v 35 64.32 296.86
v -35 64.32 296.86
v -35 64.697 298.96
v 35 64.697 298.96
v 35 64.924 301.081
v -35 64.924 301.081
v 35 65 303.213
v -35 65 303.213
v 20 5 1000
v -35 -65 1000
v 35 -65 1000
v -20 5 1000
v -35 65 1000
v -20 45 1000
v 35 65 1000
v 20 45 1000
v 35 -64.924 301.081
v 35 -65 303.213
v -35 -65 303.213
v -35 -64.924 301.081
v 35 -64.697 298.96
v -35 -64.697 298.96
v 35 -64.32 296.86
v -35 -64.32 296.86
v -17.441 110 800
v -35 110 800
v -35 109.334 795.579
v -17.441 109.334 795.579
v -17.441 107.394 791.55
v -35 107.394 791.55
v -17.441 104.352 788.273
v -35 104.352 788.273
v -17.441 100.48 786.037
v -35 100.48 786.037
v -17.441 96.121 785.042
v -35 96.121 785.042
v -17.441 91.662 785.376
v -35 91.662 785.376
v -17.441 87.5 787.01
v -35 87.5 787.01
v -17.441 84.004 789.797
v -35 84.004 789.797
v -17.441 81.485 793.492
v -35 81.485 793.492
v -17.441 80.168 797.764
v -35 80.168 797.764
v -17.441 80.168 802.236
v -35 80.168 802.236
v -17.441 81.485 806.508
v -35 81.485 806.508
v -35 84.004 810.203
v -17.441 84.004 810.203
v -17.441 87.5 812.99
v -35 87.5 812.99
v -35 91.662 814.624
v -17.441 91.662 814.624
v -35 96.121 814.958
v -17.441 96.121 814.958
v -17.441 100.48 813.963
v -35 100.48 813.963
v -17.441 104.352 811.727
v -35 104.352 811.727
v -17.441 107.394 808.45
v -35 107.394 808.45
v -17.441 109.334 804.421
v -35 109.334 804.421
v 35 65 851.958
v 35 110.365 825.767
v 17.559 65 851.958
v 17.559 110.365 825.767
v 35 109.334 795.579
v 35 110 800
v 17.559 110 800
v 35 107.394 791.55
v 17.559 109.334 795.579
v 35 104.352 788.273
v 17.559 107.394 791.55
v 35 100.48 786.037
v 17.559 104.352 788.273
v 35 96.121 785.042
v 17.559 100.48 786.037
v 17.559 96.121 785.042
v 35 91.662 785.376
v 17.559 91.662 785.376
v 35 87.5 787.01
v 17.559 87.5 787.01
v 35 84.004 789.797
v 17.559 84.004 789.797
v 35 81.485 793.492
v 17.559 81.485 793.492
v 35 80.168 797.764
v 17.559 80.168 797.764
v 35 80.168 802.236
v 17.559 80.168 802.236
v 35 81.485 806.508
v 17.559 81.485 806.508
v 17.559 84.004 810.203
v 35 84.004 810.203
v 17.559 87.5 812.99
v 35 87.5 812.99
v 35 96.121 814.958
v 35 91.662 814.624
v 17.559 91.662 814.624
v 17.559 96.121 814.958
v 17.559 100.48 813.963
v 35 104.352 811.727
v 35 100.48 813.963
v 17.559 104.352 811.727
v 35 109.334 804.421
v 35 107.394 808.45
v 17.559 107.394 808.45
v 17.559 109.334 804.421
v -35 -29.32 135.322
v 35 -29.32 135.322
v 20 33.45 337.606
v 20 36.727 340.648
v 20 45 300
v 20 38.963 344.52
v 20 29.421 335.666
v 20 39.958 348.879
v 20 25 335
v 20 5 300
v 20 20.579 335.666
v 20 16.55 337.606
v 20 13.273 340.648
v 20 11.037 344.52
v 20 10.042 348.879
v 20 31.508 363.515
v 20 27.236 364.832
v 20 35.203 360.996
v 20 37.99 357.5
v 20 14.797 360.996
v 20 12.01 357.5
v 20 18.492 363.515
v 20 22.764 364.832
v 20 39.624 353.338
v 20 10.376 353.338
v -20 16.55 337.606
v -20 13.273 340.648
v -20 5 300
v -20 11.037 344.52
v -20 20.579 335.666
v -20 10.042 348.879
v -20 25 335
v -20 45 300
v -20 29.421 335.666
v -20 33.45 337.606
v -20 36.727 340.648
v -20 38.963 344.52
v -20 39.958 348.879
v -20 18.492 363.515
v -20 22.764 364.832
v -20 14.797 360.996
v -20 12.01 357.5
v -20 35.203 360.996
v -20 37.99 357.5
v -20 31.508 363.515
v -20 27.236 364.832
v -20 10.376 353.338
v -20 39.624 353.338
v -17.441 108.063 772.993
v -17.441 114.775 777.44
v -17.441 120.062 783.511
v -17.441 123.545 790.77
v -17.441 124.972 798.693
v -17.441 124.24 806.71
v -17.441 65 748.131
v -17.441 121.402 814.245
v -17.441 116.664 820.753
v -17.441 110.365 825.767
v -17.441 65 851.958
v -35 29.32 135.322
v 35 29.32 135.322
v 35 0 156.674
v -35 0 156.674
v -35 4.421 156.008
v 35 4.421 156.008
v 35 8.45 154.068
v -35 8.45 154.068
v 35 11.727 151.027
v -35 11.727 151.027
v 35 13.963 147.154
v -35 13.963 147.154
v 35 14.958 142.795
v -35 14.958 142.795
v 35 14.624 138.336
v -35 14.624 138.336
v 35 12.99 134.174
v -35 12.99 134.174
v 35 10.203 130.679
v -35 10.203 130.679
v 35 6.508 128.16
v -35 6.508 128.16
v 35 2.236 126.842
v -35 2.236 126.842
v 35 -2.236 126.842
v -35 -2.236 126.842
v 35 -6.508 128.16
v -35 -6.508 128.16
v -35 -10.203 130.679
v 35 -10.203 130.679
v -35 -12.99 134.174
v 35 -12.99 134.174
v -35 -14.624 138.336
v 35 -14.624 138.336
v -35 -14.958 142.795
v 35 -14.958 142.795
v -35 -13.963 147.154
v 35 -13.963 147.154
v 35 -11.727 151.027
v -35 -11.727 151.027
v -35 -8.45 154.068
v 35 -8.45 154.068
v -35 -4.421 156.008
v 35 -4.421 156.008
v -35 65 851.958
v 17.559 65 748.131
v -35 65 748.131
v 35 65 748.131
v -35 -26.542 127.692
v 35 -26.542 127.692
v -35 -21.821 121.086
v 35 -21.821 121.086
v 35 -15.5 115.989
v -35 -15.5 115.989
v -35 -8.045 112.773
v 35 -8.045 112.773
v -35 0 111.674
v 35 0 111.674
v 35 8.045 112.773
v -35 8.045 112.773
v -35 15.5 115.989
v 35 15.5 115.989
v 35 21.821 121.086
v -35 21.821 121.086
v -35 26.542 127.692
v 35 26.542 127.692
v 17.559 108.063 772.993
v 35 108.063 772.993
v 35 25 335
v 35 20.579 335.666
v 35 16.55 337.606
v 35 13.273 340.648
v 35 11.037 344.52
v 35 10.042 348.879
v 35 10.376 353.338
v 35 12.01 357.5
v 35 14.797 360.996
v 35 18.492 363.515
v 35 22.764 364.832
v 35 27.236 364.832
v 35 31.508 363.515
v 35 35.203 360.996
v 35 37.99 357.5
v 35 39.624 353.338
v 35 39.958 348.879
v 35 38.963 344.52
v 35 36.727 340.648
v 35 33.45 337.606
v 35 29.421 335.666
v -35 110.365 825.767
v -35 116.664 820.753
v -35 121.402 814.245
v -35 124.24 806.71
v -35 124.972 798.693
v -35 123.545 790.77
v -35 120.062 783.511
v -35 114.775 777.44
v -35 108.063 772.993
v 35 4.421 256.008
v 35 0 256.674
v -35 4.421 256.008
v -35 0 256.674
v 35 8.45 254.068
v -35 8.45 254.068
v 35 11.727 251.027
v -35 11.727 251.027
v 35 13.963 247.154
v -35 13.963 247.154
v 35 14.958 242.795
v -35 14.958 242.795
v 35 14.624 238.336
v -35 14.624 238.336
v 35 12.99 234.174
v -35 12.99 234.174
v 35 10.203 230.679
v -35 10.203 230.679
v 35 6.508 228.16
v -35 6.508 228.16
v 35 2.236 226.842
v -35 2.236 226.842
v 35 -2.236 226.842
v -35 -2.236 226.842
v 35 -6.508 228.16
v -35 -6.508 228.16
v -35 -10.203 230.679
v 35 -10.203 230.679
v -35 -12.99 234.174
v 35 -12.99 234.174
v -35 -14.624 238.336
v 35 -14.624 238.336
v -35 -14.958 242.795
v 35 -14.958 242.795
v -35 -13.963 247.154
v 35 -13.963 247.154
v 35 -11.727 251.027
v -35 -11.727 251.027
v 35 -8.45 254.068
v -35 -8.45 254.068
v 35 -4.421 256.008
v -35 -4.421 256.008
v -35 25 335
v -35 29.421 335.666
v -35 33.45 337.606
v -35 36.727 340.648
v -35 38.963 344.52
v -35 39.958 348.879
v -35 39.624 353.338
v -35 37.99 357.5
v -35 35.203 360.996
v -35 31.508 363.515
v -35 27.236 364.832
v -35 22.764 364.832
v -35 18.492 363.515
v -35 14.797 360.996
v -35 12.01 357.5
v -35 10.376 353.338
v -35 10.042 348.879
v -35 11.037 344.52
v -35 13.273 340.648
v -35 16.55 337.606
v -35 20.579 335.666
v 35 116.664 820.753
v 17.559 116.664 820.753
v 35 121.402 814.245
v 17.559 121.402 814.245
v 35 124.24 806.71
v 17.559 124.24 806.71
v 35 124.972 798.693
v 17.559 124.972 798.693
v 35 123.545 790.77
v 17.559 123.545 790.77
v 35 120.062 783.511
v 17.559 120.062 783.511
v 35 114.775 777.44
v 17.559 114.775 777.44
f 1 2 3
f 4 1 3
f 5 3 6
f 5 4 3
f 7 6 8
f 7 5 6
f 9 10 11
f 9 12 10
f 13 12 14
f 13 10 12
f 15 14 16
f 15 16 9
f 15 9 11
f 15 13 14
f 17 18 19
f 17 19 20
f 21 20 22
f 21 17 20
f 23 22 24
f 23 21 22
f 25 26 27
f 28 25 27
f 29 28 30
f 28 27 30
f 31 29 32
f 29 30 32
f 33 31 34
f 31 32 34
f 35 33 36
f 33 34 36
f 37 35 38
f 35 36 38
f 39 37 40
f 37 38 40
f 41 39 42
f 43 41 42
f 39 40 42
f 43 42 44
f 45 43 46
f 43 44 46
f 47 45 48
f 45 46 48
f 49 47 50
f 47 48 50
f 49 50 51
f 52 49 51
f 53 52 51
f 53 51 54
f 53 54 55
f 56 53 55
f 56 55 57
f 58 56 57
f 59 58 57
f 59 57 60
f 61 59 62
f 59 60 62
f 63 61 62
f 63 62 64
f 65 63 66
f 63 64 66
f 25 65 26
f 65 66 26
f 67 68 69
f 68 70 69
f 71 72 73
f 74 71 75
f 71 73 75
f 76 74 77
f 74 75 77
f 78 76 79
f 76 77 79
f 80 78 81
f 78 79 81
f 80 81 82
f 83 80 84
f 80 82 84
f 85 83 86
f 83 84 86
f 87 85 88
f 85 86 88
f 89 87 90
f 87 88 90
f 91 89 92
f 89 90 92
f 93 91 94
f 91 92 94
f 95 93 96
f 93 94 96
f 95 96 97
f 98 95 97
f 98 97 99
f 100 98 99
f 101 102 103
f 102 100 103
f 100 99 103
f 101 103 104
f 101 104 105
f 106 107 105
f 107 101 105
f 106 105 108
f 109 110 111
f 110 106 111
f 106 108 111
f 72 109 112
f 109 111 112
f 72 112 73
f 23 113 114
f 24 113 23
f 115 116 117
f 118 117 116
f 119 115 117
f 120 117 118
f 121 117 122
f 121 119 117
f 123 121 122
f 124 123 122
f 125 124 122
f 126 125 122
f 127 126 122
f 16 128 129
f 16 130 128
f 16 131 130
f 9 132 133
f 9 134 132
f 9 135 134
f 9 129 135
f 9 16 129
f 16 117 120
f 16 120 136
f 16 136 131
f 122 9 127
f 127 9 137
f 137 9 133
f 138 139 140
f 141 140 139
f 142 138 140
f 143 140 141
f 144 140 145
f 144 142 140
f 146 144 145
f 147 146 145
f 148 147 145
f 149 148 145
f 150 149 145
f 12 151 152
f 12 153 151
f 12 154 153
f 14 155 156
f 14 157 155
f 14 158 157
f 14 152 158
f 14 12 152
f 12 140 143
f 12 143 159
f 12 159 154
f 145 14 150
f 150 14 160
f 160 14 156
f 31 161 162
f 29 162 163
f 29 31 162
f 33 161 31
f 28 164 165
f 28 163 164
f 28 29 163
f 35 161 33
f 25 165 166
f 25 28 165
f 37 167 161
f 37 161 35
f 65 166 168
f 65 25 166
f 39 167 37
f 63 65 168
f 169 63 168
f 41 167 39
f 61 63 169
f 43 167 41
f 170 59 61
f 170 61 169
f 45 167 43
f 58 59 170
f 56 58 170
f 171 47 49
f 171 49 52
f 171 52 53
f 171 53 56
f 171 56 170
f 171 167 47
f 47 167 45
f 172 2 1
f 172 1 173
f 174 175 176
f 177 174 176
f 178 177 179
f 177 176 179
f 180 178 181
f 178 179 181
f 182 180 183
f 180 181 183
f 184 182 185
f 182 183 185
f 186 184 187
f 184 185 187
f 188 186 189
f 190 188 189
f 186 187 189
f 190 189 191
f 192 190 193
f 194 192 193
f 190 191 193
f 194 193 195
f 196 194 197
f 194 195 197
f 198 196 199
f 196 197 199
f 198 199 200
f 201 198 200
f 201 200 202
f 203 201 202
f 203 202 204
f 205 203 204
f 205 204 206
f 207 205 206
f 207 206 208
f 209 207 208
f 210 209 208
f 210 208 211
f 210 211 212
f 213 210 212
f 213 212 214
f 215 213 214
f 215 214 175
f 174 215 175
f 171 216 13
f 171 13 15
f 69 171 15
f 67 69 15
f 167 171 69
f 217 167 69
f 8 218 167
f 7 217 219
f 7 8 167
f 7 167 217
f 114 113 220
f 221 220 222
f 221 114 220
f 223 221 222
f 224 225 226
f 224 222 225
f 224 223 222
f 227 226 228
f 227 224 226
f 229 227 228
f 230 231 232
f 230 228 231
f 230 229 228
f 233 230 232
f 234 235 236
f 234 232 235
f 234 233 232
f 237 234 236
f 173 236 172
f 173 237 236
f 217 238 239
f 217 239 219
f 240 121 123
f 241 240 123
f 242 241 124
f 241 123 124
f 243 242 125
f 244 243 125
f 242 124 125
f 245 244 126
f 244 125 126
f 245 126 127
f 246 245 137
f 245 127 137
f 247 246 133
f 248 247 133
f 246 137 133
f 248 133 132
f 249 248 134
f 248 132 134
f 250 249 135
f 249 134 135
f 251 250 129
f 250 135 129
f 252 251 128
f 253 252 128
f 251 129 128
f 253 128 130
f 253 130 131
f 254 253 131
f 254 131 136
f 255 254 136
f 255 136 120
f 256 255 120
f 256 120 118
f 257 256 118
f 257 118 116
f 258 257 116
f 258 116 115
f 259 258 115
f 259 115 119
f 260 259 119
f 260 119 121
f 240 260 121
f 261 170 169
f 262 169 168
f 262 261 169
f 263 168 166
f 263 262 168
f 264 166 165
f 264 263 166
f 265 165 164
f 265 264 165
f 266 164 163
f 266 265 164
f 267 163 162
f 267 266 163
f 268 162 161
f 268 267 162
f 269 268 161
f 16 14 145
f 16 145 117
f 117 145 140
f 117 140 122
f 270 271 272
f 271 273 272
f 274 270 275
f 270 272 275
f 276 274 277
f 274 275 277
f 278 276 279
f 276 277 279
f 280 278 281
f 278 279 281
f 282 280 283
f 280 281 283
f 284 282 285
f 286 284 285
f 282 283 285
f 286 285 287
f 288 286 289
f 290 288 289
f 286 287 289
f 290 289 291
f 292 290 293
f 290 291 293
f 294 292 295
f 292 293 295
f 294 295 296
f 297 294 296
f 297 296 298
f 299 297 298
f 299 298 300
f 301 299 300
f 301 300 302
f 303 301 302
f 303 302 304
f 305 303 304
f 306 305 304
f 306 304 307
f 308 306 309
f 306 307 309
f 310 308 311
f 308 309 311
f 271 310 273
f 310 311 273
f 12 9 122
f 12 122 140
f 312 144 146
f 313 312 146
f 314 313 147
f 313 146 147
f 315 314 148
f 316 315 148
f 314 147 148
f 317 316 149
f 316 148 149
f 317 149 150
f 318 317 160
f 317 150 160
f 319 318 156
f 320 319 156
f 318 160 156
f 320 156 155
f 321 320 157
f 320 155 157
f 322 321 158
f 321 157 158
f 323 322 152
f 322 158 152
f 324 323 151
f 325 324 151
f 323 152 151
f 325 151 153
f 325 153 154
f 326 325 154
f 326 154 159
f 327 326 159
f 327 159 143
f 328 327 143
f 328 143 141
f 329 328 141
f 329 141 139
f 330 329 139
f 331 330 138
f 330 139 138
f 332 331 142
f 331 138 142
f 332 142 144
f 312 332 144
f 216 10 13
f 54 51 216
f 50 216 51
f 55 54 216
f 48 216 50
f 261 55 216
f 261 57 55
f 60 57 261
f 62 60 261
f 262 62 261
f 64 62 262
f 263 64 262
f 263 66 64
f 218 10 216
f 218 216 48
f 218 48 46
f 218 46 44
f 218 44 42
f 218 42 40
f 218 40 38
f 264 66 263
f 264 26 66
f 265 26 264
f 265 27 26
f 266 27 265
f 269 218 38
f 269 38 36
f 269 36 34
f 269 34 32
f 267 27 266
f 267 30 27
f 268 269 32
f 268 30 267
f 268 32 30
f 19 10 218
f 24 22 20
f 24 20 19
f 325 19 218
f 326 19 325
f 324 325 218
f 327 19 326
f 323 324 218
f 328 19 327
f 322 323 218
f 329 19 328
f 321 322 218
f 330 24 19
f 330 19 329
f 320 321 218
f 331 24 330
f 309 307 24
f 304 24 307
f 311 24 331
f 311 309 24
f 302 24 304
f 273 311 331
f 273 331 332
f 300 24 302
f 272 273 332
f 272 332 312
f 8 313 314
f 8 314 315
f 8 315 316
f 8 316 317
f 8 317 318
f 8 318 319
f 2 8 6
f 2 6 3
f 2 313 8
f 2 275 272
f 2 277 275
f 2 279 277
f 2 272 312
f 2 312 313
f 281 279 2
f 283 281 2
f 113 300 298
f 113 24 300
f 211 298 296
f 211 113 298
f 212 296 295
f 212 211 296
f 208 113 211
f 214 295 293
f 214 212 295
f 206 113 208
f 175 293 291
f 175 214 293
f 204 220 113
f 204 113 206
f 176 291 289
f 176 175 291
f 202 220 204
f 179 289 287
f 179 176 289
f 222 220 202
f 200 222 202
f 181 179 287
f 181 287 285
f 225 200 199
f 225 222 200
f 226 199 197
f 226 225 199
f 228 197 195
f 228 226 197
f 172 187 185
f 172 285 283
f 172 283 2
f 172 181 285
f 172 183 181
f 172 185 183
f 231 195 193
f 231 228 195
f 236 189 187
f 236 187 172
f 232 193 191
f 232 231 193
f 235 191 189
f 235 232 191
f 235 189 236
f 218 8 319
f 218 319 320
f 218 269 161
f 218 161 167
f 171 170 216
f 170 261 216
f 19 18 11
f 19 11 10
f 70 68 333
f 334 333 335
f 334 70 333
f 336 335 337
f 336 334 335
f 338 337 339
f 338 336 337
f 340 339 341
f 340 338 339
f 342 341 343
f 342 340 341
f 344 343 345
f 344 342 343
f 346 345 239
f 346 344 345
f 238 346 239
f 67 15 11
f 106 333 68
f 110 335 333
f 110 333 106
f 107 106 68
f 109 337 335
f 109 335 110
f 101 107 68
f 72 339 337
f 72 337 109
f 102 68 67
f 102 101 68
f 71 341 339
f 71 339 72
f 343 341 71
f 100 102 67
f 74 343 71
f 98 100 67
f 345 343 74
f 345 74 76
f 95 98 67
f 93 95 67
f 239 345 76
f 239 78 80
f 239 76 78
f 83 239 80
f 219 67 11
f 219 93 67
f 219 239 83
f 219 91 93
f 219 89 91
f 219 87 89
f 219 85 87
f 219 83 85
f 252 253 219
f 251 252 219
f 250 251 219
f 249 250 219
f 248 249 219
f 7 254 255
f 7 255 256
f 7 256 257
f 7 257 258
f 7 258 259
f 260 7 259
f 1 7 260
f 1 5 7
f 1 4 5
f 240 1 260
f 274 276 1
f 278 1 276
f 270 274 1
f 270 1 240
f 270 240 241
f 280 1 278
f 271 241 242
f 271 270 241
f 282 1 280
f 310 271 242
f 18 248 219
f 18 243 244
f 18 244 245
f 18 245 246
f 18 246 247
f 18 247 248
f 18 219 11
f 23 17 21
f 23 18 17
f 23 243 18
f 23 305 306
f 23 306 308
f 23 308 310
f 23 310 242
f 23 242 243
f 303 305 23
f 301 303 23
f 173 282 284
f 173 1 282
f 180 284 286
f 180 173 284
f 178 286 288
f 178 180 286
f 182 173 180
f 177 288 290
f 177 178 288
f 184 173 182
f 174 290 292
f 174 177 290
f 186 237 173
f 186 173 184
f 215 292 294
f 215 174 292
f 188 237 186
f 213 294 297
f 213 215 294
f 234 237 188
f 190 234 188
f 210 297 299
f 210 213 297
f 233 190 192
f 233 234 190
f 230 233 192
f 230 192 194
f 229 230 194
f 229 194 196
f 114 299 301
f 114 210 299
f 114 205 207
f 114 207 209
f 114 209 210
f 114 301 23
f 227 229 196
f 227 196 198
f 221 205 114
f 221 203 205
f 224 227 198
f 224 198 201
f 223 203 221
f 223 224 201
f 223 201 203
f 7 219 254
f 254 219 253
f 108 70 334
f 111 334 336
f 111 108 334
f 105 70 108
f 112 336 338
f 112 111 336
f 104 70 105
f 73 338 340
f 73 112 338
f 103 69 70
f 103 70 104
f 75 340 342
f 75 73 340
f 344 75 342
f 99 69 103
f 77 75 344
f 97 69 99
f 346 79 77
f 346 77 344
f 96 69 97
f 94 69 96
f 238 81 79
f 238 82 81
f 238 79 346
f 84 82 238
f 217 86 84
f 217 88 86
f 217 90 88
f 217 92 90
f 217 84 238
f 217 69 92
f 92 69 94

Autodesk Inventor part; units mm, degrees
ref_plane "YZ Plane" through (0, 0, 0) normal (1, 0, 0) x (0, 1, 0)
ref_plane "XZ Plane" through (0, 0, 0) normal (0, 1, 0) x (-1, 0, 0)
ref_plane "XY Plane" through (0, 0, 0) normal (0, 0, 1) x (1, 0, 0)
sketch "草图1" plane through (0, 0, 0) normal (0, 0, 1) x (1, 0, 0)
  line L0 (-35, 65) -> (35, 65)
  line L1 (35, 65) -> (35, -65)
  line L2 (35, -65) -> (-35, -65)
  line L3 (-35, -65) -> (-35, 65)
  line L4 (-35, 65) -> (35, -65) construction
  line L5 (35, 65) -> (-35, -65) construction
  point P0 (0, 0)
  dimension "d0" = 70
  dimension "d1" = 130
extrude "拉伸1" add sketch "草图1" along normal blind 1000
sketch "草图2" plane through (-35, -65, 0) normal (-1, 0, 0) x (0, 0, 1)
  line L0 (0, 65) -> (300, 0)
  line L1 (0, 0) -> (1000, 0) projected
  line L2 (0, 130) -> (1000, 130) projected
  line L3 (300, 130) -> (0, 65)
  line L4 (300, 0) -> (300, 130)
  line L5 (0, 0) -> (0, 130) projected
  dimension "d4" = 300
extrude "拉伸2" cut sketch "草图2" against normal through all contours L5 L2 L3 | L0 L1 L5
fillet "圆角1" radius 30 3 edges at (0, 0, 0) (0, 65, 300) (0, -65, 300)
sketch "草图3" plane through (-35, -65, 1000) normal (-1, 0, 0) x (0, 0, 1)
  arc A0 (-864.6783, 94.3197) -> (-864.6783, 35.6803) centre (-858.3257, 65) ccw projected
  circle A1 centre (-858.3257, 65) radius 15
  circle A2 centre (-758.3257, 65) radius 15
  point P0 (-1000, 65)
  dimension "d8" = 30
  dimension "d11" = 30
  dimension "d12" = 100
extrude "拉伸3" cut sketch "草图3" against normal through all
sketch "草图4" plane through (0, 0, 1000) normal (0, 0, 1) x (1, 0, 0)
  line L0 (-53.3891, 25) -> (64.6192, 25)
  line L1 (0, 81.4777) -> (0, 16.0102)
  line L2 (-20, 45) -> (20, 45)
  line L3 (20, 45) -> (20, 5)
  line L4 (20, 5) -> (-20, 5)
  line L5 (-20, 5) -> (-20, 45)
  line L6 (-20, 45) -> (20, 5) construction
  line L7 (20, 45) -> (-20, 5) construction
  line L8 (35, 65) -> (-35, 65) projected
  point P0 (0, 0)
  point P1 (0, 25)
  dimension "d13" = 40
  dimension "d14" = 40
  dimension "d15" = 40
extrude "拉伸4" cut sketch "草图4" against normal blind 700
sketch "草图5" plane through (-20, 5, 1000) normal (1, 0, 0) x (0, 0, -1)
  line L0 (-16.4327, 20) -> (719.4245, 20)
  line L1 (696.7873, 60) -> (0, 60) projected
  circle A0 centre (650, 20) radius 15
  line L2 (0, -70) -> (0, 60) projected
  point P0 (1000, -5)
  dimension "d18" = 40
  dimension "d19" = 30
  dimension "d20" = 650
extrude "拉伸5" cut sketch "草图5" along normal mid plane 700
sketch "草图6" plane through (0, 0, 0) normal (1, 0, 0) x (0, 1, 0)
  circle A0 centre (95, 800) radius 15
  line L0 (65, 303.2127) -> (65, 1000) projected
  line L1 (-65, 1000) -> (65, 1000) projected
  line L2 (95.8043, 829.9892) -> (131.374, 829.9892) construction
  line L3 (109.6775, 773.8357) -> (183.0515, 773.8357) construction
  line L4 (65, 847.7741) -> (65, 745.182)
  circle A1 centre (95, 800) radius 30
  line L5 (110.3646, 825.7668) -> (65, 851.9581)
  line L6 (110.3646, 825.7668) -> (162.747, 825.7668) construction
  line L7 (65, 851.9581) -> (65, 745.182)
  line L8 (65, 303.2127) -> (65, 1000) projected
  line L9 (111.8573, 775.184) -> (65, 748.131)
  line L10 (111.8573, 775.184) -> (168.7185, 775.184) construction
  point P0 (0, 0)
  dimension "d23" = 30
  dimension "d25" = 30
  dimension "d26" = 200
  dimension "d29" = 60
  dimension "d30" = 150
  dimension "d31" = 150
extrude "拉伸6" add sketch "草图6" along normal mid plane 70
sketch "草图7" plane through (-35, 65, 1000) normal (0, 1, 0) x (1, 0, 0)
  line L0 (70, 148.0419) -> (0, 148.0419) projected
  line L1 (35, 148.0419) -> (35, 251.869)
  line L2 (0, 251.869) -> (70, 251.869) projected
  line L3 (0, 185) -> (0, 215) projected
  line L4 (0, 200) -> (70.1178, 200)
  line L5 (17.5589, 104.0655) -> (52.5589, 104.0655)
  line L6 (52.5589, 104.0655) -> (52.5589, 295.9345)
  line L7 (52.5589, 295.9345) -> (17.5589, 295.9345)
  line L8 (17.5589, 295.9345) -> (17.5589, 104.0655)
  line L9 (17.5589, 104.0655) -> (52.5589, 295.9345) construction
  line L10 (52.5589, 104.0655) -> (17.5589, 295.9345) construction
  point P0 (35, 1000)
  point P1 (35.0589, 200)
  dimension "d35" = 35
extrude "拉伸7" cut sketch "草图7" along normal blind 70
properties part number "DipperSon" material "钢，高强度，低合金"
